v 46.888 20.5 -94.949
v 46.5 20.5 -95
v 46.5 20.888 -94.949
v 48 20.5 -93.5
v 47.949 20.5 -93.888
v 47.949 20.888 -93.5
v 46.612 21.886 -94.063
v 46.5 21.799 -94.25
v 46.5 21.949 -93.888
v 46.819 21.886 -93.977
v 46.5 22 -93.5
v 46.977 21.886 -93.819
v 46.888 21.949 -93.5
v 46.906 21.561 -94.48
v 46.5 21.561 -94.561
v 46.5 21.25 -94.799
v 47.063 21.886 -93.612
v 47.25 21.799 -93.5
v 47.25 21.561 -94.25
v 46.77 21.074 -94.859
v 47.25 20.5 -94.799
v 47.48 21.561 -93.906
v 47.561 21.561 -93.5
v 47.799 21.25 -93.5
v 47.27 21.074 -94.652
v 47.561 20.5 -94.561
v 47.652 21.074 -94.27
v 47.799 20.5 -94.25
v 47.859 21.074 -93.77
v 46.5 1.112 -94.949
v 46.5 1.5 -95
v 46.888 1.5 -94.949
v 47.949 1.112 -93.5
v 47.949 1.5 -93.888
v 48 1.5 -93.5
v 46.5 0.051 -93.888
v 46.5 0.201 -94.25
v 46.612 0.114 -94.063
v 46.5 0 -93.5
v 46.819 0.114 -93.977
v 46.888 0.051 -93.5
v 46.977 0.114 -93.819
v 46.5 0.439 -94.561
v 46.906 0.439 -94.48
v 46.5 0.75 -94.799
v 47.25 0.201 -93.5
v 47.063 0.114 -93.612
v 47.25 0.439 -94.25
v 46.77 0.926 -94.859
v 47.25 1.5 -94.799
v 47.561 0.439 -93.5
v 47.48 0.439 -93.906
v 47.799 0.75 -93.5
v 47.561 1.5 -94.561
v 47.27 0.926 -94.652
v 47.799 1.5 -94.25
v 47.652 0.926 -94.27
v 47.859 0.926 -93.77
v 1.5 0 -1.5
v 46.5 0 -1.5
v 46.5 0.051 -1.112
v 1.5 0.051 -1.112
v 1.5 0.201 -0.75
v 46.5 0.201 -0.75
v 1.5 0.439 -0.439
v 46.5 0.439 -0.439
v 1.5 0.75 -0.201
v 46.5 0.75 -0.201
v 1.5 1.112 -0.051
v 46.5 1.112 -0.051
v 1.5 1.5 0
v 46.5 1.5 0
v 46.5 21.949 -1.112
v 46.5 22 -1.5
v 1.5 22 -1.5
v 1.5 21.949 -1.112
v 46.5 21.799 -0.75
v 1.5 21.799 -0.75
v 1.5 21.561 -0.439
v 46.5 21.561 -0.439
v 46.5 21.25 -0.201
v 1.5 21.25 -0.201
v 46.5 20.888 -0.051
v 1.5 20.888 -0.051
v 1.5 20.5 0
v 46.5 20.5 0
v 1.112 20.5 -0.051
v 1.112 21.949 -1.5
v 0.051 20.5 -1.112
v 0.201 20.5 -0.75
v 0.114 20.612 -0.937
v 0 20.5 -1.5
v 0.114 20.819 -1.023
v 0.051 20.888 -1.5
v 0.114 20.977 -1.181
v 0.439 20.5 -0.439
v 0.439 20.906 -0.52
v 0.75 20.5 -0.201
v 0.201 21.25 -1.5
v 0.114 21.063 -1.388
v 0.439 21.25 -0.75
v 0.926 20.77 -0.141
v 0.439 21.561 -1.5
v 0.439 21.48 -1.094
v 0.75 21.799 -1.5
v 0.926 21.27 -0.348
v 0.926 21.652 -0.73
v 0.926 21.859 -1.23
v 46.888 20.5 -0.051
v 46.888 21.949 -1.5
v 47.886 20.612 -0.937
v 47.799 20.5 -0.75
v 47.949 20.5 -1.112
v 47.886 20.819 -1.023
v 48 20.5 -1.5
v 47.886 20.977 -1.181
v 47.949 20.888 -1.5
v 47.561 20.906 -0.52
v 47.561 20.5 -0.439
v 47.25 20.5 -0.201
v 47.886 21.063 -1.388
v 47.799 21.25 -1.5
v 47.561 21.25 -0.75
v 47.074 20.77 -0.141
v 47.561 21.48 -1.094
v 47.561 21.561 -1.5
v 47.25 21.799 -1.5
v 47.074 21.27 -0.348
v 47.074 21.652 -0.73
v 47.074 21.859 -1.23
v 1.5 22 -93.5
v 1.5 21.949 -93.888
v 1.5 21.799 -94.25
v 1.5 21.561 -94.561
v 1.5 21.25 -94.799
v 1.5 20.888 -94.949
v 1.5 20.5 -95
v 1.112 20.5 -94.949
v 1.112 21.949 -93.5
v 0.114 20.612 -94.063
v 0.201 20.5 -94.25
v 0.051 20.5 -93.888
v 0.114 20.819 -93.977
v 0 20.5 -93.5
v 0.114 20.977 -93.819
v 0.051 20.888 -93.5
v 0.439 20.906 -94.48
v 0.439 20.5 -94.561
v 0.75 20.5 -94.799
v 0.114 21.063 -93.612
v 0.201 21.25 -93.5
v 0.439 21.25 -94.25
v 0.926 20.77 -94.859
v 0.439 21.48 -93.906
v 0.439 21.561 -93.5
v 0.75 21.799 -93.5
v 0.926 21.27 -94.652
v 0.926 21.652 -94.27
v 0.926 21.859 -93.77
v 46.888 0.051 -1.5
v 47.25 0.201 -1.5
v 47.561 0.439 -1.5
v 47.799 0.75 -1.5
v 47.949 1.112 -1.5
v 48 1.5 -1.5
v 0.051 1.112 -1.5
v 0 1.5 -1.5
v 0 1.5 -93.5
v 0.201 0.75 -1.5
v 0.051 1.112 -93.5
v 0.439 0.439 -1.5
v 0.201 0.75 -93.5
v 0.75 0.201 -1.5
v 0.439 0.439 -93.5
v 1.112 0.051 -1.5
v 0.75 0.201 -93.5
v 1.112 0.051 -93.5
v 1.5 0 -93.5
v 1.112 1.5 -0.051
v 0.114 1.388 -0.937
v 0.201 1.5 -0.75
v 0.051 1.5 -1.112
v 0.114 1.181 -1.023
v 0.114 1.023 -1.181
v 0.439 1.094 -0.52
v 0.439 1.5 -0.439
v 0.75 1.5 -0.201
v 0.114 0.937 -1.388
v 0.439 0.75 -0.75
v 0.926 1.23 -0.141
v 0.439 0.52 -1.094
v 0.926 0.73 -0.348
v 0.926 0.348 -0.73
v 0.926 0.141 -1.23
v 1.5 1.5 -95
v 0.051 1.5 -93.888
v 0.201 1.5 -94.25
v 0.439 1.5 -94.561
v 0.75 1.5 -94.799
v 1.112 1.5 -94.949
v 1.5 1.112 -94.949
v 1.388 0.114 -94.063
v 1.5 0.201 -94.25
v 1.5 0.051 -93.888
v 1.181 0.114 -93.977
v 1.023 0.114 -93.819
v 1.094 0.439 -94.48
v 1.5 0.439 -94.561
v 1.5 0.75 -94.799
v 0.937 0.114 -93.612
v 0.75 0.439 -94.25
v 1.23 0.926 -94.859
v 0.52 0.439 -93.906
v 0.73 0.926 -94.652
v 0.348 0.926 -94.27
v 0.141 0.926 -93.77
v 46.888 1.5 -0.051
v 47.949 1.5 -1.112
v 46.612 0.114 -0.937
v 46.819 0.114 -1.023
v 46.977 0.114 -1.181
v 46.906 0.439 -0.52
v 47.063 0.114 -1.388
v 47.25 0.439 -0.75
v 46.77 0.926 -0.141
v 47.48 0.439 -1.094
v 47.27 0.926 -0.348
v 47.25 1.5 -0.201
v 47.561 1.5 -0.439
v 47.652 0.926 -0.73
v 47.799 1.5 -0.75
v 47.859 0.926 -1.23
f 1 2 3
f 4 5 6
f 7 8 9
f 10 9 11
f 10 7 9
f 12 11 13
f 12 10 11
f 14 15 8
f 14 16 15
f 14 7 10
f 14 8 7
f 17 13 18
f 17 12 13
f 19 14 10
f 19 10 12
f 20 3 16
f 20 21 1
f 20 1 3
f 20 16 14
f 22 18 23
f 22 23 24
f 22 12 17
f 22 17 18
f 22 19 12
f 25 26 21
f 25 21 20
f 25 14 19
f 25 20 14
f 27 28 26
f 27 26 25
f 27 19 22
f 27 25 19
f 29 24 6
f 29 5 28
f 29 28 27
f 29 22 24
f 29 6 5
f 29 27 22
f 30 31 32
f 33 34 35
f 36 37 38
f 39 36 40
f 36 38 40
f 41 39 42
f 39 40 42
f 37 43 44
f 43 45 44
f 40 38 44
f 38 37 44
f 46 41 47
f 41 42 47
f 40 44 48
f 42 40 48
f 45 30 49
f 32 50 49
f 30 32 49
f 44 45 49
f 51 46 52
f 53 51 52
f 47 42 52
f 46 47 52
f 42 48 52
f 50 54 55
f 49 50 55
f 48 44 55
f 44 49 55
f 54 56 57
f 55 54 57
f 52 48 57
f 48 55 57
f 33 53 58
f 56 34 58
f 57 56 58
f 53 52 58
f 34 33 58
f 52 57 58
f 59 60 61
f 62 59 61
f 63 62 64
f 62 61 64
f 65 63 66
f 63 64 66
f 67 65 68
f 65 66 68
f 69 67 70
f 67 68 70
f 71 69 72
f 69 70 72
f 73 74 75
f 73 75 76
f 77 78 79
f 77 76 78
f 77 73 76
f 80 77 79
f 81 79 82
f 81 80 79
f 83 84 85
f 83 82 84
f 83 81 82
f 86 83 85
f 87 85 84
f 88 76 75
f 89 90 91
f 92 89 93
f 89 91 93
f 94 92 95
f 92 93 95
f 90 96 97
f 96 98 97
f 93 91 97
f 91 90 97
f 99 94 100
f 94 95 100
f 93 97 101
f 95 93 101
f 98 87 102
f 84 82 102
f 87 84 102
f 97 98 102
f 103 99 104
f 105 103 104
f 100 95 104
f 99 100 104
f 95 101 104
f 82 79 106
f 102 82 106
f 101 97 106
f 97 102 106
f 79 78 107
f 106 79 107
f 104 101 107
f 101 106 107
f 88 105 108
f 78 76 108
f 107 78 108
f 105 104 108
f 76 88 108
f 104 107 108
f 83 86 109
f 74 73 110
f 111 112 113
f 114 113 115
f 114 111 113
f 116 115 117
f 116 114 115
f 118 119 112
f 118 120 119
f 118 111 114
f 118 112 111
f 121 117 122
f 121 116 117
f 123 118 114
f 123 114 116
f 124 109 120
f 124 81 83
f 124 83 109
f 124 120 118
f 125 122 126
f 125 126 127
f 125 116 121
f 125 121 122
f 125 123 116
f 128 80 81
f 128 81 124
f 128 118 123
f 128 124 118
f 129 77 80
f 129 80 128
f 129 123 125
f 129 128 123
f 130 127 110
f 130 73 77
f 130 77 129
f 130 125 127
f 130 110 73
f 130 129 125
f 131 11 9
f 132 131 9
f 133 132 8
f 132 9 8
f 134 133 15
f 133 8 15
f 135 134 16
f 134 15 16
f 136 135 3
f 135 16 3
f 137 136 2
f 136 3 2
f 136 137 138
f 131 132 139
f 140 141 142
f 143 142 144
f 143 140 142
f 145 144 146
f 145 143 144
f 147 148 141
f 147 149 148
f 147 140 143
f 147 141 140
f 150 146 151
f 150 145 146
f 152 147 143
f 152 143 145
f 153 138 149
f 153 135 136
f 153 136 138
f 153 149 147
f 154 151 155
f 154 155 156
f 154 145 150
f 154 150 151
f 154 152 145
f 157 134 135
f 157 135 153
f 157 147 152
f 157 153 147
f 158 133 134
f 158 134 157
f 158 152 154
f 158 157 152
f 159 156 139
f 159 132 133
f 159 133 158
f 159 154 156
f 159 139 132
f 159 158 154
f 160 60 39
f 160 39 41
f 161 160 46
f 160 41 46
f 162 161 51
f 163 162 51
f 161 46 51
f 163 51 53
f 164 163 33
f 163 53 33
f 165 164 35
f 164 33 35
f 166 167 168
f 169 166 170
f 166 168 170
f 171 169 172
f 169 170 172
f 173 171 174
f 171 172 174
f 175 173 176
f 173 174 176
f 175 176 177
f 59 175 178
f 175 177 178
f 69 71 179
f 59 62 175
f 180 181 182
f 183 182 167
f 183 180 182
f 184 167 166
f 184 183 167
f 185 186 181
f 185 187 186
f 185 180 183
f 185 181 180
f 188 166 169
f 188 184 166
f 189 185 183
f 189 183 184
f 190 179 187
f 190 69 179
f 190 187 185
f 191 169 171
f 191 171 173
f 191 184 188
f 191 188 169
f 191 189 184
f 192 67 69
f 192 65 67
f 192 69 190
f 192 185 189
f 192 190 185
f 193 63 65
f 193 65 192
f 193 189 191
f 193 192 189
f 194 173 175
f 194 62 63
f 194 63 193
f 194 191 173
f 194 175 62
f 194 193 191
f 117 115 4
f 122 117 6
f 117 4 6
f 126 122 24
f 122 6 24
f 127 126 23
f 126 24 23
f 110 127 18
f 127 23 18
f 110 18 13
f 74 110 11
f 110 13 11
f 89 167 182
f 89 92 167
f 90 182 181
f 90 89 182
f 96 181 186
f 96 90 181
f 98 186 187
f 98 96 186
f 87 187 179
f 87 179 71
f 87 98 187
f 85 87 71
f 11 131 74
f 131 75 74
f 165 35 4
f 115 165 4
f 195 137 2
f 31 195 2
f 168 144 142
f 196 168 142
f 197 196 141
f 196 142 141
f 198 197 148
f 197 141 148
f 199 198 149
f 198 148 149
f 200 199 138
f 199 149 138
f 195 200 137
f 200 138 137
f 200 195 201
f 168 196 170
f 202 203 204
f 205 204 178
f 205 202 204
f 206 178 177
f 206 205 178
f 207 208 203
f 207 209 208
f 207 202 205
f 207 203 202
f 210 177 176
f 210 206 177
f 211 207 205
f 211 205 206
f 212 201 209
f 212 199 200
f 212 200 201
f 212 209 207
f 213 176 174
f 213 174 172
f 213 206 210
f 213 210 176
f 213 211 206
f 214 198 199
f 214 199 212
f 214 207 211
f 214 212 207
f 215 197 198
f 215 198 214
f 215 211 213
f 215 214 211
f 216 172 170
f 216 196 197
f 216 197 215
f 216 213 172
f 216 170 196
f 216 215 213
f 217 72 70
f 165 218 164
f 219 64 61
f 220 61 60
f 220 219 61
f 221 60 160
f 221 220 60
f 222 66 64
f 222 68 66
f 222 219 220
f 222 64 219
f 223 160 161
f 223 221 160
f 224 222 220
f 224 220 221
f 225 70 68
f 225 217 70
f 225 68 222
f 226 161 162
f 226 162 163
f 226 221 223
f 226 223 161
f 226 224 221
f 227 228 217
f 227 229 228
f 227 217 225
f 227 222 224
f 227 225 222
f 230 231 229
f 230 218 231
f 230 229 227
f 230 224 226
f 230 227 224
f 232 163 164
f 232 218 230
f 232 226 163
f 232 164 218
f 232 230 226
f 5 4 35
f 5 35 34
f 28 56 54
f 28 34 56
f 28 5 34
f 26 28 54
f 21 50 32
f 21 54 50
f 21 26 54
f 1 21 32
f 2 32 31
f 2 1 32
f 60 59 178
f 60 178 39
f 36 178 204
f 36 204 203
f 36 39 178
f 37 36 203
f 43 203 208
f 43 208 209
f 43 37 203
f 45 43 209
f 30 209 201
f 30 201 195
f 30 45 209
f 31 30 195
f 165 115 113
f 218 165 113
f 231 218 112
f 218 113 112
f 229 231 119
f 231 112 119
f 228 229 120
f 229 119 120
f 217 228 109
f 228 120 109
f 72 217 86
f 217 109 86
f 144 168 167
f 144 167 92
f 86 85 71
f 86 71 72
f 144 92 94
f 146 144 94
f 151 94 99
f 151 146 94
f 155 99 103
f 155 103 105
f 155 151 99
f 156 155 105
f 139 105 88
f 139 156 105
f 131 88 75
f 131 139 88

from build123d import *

# Parameters (mm, degrees)
SKETCH_1_W      = 48
SKETCH_1_H      = 22
EXTRUDE_1_DEPTH = 95
FILLET_1_R      = 1.5


with BuildPart() as part:
    # Эскиз1 → Бобышка-Вытянуть1 (new body)
    with BuildSketch(Plane.XY):
        with Locations((24, 11)):
            Rectangle(SKETCH_1_W, SKETCH_1_H)
    extrude(amount=-EXTRUDE_1_DEPTH)

    # Скругление1
    fillet_1_edges = [part.edges().sort_by_distance(p)[0] for p in [
        (48, 11, -95),
        (24, 22, -95),
        (0, 11, -95),
        (24, 22, 0),
        (48, 11, 0),
        (24, 0, 0),
        (0, 11, 0),
        (24, 0, -95),
        (0, 22, -47.5),
        (48, 22, -47.5),
        (48, 0, -47.5),
        (0, 0, -47.5),
    ]]
    fillet(fillet_1_edges, radius=FILLET_1_R)


solid = part.part
